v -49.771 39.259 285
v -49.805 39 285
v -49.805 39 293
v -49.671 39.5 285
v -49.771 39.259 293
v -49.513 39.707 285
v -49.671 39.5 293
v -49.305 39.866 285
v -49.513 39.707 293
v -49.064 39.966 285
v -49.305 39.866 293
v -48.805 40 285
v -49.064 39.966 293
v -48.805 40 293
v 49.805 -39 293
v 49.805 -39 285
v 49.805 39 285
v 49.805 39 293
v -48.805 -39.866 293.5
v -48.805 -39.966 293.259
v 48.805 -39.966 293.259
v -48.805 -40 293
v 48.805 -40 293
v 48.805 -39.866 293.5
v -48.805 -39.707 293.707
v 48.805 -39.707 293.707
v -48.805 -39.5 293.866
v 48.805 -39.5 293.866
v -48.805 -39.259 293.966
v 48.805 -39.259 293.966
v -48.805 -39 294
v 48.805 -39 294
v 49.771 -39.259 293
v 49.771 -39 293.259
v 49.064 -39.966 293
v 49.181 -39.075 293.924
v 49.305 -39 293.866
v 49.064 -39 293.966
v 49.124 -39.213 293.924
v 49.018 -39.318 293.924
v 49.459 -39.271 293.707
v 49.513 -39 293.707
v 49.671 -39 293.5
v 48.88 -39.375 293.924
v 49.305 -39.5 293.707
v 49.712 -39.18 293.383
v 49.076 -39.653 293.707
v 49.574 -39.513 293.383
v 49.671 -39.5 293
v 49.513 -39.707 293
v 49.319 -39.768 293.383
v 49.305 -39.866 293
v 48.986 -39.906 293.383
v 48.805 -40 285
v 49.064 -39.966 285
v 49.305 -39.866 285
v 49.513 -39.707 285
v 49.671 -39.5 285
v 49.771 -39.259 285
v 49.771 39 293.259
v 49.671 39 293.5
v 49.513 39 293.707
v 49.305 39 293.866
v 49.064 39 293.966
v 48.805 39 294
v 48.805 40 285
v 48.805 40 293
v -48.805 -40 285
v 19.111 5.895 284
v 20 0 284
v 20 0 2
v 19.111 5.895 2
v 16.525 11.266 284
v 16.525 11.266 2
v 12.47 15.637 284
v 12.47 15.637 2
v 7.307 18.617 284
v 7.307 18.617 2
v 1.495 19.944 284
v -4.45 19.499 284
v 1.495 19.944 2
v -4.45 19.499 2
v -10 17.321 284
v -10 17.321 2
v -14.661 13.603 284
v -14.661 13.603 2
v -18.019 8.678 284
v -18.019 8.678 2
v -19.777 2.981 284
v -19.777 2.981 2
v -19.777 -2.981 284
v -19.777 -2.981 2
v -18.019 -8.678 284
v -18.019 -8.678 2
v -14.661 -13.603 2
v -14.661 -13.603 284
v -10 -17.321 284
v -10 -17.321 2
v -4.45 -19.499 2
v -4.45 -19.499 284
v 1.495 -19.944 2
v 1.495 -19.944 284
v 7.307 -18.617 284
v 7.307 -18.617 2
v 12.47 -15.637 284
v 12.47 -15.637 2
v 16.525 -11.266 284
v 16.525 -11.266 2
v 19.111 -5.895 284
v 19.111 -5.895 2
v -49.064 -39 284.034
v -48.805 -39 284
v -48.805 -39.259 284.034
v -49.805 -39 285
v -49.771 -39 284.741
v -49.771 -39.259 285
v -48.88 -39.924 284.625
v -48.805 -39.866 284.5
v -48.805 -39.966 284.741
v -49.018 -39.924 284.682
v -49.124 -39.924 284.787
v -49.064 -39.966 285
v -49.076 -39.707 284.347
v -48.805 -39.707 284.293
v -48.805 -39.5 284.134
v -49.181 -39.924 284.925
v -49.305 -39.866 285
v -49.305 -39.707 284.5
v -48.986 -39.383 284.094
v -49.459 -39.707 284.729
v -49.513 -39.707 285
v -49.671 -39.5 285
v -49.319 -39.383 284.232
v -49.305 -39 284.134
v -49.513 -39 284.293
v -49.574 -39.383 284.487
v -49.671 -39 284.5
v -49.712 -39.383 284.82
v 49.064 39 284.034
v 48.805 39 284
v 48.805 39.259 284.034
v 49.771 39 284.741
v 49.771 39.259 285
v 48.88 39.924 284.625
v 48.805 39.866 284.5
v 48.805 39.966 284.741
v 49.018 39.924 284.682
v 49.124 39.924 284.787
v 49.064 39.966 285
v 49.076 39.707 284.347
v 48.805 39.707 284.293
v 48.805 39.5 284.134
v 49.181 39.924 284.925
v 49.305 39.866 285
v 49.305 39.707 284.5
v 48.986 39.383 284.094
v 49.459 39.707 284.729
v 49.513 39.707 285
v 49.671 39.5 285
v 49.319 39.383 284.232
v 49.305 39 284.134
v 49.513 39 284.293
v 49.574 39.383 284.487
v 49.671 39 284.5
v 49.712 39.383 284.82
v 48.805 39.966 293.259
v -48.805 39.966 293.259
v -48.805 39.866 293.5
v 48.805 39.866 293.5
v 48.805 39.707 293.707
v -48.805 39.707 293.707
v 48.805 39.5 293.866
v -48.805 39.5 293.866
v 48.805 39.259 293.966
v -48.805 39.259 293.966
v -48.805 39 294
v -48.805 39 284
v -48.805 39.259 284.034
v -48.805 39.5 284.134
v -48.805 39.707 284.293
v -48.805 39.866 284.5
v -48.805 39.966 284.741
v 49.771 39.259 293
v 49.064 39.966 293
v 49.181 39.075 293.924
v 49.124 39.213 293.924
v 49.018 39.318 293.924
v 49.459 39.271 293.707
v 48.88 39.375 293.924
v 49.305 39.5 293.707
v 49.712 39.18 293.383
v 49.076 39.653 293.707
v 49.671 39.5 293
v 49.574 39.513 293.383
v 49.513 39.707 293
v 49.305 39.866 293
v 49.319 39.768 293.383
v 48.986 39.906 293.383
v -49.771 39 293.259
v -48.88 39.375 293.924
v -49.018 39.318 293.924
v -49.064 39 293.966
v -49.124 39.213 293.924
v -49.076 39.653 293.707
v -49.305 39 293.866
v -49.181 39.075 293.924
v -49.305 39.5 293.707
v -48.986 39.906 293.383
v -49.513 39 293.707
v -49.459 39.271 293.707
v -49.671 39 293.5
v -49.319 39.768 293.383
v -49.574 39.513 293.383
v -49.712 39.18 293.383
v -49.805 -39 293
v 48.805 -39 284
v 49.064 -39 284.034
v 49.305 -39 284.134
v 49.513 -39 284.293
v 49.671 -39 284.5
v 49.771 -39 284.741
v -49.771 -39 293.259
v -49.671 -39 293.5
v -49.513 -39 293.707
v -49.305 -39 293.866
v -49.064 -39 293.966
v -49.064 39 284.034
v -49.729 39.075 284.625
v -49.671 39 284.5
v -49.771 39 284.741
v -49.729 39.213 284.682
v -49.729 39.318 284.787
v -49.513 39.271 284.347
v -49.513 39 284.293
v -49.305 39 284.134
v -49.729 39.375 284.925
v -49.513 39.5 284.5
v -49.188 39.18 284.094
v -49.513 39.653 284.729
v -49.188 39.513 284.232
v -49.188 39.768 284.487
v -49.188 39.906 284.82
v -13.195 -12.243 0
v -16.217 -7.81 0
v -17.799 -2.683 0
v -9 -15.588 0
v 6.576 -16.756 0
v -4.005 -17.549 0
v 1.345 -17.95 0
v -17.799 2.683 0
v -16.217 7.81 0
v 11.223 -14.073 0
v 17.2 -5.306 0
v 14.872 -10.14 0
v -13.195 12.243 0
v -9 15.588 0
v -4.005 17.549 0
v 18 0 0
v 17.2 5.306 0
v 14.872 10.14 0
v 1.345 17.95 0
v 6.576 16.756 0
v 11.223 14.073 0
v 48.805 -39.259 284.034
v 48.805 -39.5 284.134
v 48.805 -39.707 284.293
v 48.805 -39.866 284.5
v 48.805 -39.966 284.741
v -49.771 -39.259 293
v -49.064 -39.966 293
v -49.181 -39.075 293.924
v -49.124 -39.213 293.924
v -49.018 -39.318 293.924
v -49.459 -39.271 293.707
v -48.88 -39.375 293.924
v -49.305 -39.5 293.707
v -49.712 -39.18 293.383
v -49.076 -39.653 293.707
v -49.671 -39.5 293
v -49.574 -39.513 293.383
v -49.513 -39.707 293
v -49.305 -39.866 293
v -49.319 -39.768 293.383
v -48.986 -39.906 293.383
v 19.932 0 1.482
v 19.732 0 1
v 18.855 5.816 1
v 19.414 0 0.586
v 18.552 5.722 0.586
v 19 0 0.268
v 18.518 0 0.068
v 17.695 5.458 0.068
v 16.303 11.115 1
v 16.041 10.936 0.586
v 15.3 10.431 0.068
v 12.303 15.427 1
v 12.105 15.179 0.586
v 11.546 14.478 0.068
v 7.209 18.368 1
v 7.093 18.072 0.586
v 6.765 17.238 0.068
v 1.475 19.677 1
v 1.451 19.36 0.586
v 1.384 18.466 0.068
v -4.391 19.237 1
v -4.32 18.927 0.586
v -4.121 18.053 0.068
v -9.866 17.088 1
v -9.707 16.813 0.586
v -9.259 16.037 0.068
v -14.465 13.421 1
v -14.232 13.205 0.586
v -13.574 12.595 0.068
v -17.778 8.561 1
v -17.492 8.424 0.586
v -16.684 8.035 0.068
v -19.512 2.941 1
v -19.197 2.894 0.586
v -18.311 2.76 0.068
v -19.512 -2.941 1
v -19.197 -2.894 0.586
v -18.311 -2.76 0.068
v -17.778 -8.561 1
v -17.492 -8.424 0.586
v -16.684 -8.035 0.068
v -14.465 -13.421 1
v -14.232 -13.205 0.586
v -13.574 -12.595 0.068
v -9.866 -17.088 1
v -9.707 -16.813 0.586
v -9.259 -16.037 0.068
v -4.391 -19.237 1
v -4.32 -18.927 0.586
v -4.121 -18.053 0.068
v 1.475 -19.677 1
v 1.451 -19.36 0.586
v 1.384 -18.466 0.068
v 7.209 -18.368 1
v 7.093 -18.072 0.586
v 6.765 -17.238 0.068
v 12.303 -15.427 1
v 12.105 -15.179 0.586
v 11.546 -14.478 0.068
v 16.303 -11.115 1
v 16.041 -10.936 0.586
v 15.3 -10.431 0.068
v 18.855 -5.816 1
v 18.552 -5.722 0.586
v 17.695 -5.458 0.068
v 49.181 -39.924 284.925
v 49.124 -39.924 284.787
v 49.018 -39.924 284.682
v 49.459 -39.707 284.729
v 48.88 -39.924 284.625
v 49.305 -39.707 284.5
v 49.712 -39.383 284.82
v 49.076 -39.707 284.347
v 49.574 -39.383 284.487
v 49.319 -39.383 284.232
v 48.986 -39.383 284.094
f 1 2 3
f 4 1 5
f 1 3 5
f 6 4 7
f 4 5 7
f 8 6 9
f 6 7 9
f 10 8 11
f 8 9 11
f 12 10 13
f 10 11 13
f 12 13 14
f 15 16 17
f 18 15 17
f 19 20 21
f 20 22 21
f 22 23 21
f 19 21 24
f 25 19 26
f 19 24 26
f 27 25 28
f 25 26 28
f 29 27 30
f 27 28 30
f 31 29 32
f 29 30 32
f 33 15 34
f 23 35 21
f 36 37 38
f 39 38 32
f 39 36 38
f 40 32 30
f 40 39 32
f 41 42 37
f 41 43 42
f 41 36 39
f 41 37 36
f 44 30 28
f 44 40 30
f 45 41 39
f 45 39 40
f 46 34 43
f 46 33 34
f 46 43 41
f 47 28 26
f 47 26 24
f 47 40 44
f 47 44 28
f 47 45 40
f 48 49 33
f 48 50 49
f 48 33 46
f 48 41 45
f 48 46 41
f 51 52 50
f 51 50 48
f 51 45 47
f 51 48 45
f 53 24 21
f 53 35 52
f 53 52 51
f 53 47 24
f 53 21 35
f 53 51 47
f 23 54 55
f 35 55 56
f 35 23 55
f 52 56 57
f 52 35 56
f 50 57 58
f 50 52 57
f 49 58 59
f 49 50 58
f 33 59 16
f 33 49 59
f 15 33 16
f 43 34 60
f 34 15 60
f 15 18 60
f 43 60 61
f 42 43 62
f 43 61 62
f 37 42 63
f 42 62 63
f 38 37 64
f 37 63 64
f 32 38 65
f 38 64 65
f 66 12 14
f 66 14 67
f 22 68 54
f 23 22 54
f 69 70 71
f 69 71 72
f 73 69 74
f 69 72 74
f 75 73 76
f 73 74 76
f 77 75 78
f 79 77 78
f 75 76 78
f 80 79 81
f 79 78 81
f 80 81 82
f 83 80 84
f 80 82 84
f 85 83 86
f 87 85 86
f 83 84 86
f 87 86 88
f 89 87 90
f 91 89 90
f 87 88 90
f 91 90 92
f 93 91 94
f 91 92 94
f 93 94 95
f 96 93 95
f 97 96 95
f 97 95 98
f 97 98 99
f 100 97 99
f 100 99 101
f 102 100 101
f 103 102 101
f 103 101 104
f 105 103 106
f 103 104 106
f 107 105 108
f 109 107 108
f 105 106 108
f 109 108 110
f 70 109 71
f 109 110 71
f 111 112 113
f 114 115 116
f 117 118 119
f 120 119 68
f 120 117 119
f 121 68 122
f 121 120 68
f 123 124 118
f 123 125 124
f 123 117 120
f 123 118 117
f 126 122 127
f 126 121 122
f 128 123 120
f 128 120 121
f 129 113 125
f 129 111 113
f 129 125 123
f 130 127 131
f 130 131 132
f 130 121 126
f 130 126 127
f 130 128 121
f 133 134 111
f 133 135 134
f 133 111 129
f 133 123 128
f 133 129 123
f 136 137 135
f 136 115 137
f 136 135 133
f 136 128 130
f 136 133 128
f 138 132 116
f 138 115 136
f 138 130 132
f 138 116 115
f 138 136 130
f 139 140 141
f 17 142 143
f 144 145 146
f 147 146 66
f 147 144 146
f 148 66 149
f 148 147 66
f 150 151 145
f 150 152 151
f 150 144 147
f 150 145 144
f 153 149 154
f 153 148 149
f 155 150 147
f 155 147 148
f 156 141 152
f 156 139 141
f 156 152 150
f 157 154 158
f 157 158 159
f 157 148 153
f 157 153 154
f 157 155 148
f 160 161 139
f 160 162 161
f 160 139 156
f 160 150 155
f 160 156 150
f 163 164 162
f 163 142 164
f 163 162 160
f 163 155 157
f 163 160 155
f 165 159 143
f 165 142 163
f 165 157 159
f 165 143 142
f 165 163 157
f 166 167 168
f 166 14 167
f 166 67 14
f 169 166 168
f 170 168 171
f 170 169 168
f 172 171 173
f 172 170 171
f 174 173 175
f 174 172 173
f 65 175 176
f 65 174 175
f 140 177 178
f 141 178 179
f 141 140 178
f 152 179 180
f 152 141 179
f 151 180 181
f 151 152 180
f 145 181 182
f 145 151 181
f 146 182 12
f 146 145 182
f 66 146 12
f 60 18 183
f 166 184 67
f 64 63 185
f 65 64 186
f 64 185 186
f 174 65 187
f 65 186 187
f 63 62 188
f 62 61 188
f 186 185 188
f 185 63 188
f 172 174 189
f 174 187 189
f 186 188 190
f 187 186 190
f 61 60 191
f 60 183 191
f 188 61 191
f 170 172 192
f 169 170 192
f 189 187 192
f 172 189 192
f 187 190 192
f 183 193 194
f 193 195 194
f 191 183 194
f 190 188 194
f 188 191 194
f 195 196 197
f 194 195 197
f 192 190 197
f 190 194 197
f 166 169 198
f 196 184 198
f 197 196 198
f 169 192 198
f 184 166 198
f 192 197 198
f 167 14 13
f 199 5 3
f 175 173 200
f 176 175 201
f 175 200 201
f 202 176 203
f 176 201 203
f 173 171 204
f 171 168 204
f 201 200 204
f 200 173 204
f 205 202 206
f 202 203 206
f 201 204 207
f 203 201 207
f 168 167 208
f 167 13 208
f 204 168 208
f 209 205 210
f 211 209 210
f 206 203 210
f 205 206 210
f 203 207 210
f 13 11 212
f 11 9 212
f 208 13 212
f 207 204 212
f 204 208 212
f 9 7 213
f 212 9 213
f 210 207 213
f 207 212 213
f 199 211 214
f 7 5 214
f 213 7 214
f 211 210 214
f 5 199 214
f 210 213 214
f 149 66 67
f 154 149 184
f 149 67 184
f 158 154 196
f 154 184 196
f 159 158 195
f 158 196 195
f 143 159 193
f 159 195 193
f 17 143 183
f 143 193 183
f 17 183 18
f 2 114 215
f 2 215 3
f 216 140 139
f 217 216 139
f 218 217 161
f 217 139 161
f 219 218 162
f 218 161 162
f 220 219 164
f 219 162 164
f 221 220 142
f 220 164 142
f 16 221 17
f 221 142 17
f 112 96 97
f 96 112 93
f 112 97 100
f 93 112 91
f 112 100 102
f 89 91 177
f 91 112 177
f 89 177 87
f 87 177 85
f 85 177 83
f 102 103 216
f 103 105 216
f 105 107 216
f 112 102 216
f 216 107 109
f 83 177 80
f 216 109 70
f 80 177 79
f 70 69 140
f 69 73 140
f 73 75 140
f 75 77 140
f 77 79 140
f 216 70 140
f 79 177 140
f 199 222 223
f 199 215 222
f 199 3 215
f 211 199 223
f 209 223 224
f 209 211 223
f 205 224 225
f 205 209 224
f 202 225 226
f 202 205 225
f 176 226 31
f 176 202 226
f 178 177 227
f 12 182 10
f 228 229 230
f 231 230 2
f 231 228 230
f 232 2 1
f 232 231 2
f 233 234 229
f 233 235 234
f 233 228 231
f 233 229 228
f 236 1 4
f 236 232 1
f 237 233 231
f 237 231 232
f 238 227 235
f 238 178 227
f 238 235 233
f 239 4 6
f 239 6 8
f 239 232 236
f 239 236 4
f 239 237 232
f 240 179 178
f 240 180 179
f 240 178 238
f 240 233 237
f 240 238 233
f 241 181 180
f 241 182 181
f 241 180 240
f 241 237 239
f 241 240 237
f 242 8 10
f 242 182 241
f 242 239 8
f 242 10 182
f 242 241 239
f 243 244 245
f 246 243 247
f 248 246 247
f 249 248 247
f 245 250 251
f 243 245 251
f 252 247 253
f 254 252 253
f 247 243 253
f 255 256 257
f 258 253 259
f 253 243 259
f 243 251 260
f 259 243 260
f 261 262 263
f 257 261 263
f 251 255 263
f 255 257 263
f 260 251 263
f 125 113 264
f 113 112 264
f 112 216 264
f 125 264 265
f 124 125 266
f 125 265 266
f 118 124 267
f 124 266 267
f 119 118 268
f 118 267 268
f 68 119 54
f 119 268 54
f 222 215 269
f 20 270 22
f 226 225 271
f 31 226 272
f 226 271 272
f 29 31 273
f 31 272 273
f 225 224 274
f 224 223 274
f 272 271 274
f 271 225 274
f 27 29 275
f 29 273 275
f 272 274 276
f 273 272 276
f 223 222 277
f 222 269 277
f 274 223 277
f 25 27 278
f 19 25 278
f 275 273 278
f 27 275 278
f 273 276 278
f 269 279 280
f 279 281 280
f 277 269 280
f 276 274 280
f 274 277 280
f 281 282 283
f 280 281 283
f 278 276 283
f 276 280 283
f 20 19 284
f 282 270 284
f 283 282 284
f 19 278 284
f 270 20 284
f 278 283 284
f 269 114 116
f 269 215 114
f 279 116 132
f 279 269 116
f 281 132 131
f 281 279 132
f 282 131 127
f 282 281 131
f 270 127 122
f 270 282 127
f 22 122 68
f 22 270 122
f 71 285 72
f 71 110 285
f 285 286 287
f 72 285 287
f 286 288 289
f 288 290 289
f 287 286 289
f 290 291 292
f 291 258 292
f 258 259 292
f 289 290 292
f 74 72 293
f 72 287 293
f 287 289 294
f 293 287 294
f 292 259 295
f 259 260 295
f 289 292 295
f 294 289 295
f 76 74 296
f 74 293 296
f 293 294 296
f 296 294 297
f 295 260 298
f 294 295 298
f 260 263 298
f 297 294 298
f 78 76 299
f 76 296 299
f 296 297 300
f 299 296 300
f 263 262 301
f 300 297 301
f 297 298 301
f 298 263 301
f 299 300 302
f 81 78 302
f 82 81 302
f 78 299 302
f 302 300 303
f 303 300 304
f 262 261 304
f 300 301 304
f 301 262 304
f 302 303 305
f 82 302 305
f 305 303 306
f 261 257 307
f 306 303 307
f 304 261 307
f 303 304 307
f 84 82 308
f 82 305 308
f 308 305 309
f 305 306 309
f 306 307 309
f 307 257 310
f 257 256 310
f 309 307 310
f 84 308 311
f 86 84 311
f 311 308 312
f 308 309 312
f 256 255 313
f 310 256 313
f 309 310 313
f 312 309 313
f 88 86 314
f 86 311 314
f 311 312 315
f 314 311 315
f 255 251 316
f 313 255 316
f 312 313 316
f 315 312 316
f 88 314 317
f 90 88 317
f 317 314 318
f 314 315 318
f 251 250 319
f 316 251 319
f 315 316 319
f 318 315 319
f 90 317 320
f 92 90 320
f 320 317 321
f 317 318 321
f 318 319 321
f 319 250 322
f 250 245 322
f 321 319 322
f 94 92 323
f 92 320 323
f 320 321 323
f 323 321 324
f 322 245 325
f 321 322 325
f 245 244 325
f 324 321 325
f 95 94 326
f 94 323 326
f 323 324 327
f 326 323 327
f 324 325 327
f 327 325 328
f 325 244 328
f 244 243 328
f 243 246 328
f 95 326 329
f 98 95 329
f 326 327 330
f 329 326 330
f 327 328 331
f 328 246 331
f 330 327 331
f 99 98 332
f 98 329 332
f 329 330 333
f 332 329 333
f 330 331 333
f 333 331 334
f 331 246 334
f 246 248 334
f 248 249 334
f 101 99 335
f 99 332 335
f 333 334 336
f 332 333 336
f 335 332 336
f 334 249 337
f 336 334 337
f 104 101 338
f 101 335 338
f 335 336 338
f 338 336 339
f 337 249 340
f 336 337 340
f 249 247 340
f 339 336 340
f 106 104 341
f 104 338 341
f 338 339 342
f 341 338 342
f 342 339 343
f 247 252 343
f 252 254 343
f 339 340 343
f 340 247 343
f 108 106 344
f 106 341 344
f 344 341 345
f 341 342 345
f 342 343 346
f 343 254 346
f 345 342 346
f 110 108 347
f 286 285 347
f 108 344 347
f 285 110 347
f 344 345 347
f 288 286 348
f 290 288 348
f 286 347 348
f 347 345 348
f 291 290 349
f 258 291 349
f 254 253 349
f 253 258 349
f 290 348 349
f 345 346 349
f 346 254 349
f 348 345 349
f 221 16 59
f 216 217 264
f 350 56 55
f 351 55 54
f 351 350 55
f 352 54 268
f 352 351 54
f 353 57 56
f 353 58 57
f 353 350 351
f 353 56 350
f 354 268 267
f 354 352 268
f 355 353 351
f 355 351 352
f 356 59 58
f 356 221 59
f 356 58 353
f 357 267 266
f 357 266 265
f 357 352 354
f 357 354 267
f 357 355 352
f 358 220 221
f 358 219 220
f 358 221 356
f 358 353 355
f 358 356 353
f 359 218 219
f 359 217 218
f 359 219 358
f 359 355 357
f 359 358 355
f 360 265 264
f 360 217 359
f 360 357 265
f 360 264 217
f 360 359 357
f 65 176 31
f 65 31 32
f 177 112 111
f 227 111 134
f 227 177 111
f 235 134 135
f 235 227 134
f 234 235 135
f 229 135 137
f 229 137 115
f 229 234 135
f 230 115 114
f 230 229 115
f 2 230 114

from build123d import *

# Parameters (mm, degrees)
SKETCH1_R           = 20
BOSS_EXTRUDE1_DEPTH = 284
SKETCH2_W           = 99.610894942
SKETCH2_H           = 80
BOSS_EXTRUDE2_DEPTH = 10
FILLET1_R           = 2
FILLET2_R           = 1


with BuildPart() as part:
    # Sketch1 → Boss-Extrude1 (new body)
    with BuildSketch(Plane.XY):
        Circle(SKETCH1_R)
    extrude(amount=BOSS_EXTRUDE1_DEPTH)

    # Sketch2 → Boss-Extrude2 (add)
    with BuildSketch(Plane.XY.offset(284)):
        Rectangle(SKETCH2_W, SKETCH2_H)
    extrude(amount=BOSS_EXTRUDE2_DEPTH)

    # Fillet1
    fillet1_edges = [part.edges().sort_by_distance(p)[0] for p in [
        (-20, 0, 0),
    ]]
    fillet(fillet1_edges, radius=FILLET1_R)

    # Fillet2
    fillet2_edges = [part.edges().sort_by_distance(p)[0] for p in [
        (49.805447471, 0, 284),
        (49.805447471, -40, 289),
        (0, 40, 284),
        (49.805447471, 40, 289),
        (-49.805447471, 0, 284),
        (-49.805447471, 40, 289),
        (0, -40, 284),
        (-49.805447471, -40, 289),
        (49.805447471, 0, 294),
        (0, 40, 294),
        (-49.805447471, 0, 294),
        (0, -40, 294),
    ]]
    fillet(fillet2_edges, radius=FILLET2_R)


solid = part.part
